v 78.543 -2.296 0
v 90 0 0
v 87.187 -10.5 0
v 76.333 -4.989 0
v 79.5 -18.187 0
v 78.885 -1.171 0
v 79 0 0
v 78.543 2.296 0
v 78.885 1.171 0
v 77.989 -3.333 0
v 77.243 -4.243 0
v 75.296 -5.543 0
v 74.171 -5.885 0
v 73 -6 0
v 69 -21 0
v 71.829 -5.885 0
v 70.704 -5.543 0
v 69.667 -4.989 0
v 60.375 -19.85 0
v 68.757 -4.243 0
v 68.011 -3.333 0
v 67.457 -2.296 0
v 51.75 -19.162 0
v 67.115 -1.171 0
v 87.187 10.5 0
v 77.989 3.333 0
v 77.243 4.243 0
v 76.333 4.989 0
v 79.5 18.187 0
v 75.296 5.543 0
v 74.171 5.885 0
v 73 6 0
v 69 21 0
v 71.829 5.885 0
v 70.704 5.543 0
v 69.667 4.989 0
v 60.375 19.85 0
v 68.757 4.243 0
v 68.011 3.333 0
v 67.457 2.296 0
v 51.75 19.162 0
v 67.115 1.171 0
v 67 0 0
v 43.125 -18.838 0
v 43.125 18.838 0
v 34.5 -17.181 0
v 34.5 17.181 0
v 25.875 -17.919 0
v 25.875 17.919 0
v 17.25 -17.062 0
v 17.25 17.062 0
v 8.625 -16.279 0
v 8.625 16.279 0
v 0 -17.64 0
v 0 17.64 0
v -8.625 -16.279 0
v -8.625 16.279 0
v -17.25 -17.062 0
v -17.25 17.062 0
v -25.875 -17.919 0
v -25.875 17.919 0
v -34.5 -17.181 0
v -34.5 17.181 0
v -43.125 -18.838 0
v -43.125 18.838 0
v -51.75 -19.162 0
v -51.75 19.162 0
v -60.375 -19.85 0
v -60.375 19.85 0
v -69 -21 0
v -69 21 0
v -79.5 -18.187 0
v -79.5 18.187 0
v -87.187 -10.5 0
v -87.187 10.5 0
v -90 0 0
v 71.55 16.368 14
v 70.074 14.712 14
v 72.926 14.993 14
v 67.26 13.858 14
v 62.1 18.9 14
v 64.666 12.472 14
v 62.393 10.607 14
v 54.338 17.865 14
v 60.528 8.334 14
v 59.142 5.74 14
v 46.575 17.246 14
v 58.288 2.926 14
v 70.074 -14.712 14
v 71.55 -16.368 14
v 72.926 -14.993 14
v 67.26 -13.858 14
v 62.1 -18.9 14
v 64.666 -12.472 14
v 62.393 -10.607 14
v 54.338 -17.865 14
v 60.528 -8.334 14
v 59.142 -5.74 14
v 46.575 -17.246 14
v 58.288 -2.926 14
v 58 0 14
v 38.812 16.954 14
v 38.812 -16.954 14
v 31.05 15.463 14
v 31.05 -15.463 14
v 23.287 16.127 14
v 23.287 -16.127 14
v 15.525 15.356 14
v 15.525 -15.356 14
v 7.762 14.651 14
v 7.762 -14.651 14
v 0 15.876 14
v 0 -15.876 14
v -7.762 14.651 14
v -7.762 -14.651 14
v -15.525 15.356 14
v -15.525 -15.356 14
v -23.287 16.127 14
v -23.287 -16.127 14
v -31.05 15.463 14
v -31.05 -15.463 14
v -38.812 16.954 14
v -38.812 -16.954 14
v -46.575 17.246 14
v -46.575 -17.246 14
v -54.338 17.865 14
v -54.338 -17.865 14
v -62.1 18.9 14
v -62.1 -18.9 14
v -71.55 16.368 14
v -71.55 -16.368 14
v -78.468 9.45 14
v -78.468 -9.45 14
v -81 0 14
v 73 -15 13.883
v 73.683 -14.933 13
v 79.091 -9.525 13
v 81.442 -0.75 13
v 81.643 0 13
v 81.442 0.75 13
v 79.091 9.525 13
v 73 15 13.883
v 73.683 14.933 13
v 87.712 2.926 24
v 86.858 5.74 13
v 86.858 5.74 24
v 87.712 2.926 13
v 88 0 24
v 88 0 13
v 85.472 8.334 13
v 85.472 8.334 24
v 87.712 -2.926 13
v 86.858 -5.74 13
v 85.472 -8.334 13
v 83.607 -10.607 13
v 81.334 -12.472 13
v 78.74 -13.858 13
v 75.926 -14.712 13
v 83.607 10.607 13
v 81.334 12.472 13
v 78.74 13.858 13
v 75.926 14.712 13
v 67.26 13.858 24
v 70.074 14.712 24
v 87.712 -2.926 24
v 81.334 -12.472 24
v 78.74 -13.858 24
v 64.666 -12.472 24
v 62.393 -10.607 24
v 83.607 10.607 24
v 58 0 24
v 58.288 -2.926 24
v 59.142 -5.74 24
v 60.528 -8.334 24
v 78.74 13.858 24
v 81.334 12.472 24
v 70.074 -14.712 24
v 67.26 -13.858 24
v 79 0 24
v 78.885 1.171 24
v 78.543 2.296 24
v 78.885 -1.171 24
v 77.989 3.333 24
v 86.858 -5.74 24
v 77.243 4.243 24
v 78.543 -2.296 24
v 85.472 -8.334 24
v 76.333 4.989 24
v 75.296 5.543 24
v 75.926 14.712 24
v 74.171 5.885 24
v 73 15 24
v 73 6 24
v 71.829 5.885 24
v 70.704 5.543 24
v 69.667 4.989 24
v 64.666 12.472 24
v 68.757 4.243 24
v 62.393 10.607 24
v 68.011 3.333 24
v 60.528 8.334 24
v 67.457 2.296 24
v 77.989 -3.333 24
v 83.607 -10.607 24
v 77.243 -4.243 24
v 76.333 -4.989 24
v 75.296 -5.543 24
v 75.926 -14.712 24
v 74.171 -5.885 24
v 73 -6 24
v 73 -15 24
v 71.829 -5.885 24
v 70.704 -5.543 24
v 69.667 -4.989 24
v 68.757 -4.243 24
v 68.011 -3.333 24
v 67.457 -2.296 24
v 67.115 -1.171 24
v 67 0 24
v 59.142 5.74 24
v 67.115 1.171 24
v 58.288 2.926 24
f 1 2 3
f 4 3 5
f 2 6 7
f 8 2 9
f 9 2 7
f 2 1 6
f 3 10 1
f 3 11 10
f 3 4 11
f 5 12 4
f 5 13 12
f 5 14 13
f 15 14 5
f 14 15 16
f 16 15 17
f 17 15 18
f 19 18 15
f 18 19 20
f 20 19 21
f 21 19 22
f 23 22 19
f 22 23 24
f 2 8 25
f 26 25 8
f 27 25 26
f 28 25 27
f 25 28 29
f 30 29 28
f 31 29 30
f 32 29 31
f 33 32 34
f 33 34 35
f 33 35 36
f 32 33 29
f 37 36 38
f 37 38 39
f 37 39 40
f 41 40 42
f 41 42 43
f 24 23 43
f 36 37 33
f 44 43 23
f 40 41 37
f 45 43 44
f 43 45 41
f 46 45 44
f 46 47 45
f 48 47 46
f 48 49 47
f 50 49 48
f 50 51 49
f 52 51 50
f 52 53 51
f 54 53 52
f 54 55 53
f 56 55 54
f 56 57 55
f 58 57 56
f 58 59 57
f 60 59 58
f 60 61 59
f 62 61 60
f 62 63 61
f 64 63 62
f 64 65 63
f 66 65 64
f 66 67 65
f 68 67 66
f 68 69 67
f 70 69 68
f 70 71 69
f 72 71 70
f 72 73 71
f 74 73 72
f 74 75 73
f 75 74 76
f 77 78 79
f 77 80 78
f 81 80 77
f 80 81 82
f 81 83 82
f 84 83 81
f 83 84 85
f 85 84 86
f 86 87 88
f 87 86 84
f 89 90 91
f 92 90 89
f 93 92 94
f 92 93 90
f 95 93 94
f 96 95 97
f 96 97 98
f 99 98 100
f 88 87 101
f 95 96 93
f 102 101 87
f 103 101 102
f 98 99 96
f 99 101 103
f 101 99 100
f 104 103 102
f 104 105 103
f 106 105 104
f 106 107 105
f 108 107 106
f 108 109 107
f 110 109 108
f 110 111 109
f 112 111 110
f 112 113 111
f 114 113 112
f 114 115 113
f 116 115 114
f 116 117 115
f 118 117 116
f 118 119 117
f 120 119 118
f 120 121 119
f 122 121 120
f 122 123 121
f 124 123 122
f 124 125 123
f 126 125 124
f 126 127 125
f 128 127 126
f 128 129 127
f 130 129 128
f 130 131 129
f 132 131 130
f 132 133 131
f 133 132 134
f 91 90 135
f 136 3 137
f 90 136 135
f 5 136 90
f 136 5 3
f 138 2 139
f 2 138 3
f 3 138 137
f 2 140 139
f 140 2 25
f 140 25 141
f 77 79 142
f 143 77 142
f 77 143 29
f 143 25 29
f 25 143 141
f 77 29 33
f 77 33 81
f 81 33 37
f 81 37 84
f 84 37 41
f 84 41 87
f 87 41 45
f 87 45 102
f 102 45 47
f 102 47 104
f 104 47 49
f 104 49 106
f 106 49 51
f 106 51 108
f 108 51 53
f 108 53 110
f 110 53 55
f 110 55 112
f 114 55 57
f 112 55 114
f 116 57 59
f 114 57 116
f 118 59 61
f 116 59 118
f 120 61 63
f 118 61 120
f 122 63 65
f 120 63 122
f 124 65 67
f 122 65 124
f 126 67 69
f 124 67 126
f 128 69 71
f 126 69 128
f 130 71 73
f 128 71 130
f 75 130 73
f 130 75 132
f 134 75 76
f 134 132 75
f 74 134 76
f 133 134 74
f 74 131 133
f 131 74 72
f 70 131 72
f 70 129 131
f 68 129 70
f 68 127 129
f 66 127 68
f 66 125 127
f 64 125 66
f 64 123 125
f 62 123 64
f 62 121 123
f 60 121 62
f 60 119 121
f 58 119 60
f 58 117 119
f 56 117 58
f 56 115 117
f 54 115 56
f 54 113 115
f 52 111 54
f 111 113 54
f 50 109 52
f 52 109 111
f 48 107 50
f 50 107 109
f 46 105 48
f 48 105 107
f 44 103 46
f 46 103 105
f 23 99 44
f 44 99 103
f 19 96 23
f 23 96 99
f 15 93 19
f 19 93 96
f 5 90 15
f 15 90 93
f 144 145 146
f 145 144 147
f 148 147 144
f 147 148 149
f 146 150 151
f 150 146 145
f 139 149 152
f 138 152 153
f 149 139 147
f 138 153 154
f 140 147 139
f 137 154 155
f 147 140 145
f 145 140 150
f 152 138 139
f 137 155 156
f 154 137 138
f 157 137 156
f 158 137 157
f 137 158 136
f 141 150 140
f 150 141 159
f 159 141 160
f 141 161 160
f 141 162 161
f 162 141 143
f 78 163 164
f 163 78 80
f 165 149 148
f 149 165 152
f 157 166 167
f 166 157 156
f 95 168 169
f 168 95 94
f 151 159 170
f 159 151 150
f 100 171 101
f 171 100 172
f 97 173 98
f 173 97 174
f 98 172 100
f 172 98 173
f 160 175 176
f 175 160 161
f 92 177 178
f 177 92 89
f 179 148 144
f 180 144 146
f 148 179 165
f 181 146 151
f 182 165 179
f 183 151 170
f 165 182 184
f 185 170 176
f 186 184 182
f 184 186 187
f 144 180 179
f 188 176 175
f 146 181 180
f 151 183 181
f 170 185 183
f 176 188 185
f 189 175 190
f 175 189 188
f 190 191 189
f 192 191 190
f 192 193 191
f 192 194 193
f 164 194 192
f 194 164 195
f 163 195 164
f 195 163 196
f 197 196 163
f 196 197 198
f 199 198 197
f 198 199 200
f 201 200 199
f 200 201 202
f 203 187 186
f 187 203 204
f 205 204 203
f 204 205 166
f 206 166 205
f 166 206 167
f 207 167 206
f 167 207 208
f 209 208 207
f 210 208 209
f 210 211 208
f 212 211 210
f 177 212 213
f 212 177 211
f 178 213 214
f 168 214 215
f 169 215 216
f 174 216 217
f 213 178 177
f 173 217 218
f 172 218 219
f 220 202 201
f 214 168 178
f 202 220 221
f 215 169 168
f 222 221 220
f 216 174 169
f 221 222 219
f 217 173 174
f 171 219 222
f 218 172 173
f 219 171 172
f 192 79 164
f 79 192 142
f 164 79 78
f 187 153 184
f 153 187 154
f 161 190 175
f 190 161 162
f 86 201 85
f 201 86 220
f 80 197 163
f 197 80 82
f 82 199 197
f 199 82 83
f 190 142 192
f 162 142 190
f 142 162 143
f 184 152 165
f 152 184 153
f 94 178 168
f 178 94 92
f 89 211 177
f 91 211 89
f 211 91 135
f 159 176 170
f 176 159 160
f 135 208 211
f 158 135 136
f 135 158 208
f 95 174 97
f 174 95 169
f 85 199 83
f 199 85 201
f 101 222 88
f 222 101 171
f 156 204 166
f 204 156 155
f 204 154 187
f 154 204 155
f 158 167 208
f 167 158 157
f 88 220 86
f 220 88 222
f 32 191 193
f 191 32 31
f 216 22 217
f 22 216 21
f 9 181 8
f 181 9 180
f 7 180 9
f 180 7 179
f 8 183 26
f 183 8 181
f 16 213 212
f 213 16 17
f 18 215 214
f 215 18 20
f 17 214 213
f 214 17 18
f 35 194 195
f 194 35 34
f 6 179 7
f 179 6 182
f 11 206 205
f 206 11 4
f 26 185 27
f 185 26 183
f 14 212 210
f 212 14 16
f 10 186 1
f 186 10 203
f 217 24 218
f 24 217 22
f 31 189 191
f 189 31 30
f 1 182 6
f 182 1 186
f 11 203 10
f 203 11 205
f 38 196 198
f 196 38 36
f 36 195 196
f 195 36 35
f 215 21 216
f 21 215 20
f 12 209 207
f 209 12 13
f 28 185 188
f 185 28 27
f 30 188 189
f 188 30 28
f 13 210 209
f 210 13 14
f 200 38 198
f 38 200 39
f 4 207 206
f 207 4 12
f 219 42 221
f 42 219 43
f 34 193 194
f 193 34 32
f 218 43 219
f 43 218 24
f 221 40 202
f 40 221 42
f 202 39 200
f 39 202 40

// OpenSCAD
$fn = 32;

// ----------------------------------------------------------------------
// Handle: 180 x 42 mm grip, 14 mm thick
// ----------------------------------------------------------------------

// --- parameters (mm) ---
length = 180;             // grip length
width = 42;               // grip width
thickness = 14;           // grip thickness
waist = 0.8;              // width factor at the middle
draft = 0.9;              // top face scale of the extrusion
scallops = 6;             // finger rests per side
ripple = 0.05;            // depth factor of the finger rests
boss_d = 30;              // mounting boss diameter
boss_h = 10;              // mounting boss height
boss_hole_d = 12;         // screw clearance through the boss
boss_r = 73;              // boss centre from the grip centre

/* ergonomic grip outline, closed spline-like polygon in the XY plane */
grip = [[-69, 21], [-60.375, 19.85], [-51.75, 19.162], [-43.125, 18.838], [-34.5, 17.181], [-25.875, 17.919], [-17.25, 17.062], [-8.625, 16.279], [0, 17.64], [8.625, 16.279], [17.25, 17.062], [25.875, 17.919], [34.5, 17.181], [43.125, 18.838], [51.75, 19.162], [60.375, 19.85], [69, 21], [79.5, 18.187], [87.187, 10.5], [90, 0], [87.187, -10.5], [79.5, -18.187], [69, -21], [69, -21], [60.375, -19.85], [51.75, -19.162], [43.125, -18.838], [34.5, -17.181], [25.875, -17.919], [17.25, -17.062], [8.625, -16.279], [0, -17.64], [-8.625, -16.279], [-17.25, -17.062], [-25.875, -17.919], [-34.5, -17.181], [-43.125, -18.838], [-51.75, -19.162], [-60.375, -19.85], [-69, -21], [-79.5, -18.187], [-87.187, -10.5], [-90, 0], [-87.187, 10.5], [-79.5, 18.187], [-69, 21]];

module grip_body() {
  linear_extrude(height = thickness, scale = draft) polygon(grip);
}

module boss_body() {
  /* sunk 1 mm into the grip so the joint overlaps */
  translate([boss_r, 0, thickness - 1]) cylinder(h = boss_h + 1, d = boss_d);
}

difference() {
  union() {
    grip_body();
    boss_body();
  }
  translate([boss_r, 0, -1]) cylinder(h = thickness + boss_h + 2, d = boss_hole_d);
}
